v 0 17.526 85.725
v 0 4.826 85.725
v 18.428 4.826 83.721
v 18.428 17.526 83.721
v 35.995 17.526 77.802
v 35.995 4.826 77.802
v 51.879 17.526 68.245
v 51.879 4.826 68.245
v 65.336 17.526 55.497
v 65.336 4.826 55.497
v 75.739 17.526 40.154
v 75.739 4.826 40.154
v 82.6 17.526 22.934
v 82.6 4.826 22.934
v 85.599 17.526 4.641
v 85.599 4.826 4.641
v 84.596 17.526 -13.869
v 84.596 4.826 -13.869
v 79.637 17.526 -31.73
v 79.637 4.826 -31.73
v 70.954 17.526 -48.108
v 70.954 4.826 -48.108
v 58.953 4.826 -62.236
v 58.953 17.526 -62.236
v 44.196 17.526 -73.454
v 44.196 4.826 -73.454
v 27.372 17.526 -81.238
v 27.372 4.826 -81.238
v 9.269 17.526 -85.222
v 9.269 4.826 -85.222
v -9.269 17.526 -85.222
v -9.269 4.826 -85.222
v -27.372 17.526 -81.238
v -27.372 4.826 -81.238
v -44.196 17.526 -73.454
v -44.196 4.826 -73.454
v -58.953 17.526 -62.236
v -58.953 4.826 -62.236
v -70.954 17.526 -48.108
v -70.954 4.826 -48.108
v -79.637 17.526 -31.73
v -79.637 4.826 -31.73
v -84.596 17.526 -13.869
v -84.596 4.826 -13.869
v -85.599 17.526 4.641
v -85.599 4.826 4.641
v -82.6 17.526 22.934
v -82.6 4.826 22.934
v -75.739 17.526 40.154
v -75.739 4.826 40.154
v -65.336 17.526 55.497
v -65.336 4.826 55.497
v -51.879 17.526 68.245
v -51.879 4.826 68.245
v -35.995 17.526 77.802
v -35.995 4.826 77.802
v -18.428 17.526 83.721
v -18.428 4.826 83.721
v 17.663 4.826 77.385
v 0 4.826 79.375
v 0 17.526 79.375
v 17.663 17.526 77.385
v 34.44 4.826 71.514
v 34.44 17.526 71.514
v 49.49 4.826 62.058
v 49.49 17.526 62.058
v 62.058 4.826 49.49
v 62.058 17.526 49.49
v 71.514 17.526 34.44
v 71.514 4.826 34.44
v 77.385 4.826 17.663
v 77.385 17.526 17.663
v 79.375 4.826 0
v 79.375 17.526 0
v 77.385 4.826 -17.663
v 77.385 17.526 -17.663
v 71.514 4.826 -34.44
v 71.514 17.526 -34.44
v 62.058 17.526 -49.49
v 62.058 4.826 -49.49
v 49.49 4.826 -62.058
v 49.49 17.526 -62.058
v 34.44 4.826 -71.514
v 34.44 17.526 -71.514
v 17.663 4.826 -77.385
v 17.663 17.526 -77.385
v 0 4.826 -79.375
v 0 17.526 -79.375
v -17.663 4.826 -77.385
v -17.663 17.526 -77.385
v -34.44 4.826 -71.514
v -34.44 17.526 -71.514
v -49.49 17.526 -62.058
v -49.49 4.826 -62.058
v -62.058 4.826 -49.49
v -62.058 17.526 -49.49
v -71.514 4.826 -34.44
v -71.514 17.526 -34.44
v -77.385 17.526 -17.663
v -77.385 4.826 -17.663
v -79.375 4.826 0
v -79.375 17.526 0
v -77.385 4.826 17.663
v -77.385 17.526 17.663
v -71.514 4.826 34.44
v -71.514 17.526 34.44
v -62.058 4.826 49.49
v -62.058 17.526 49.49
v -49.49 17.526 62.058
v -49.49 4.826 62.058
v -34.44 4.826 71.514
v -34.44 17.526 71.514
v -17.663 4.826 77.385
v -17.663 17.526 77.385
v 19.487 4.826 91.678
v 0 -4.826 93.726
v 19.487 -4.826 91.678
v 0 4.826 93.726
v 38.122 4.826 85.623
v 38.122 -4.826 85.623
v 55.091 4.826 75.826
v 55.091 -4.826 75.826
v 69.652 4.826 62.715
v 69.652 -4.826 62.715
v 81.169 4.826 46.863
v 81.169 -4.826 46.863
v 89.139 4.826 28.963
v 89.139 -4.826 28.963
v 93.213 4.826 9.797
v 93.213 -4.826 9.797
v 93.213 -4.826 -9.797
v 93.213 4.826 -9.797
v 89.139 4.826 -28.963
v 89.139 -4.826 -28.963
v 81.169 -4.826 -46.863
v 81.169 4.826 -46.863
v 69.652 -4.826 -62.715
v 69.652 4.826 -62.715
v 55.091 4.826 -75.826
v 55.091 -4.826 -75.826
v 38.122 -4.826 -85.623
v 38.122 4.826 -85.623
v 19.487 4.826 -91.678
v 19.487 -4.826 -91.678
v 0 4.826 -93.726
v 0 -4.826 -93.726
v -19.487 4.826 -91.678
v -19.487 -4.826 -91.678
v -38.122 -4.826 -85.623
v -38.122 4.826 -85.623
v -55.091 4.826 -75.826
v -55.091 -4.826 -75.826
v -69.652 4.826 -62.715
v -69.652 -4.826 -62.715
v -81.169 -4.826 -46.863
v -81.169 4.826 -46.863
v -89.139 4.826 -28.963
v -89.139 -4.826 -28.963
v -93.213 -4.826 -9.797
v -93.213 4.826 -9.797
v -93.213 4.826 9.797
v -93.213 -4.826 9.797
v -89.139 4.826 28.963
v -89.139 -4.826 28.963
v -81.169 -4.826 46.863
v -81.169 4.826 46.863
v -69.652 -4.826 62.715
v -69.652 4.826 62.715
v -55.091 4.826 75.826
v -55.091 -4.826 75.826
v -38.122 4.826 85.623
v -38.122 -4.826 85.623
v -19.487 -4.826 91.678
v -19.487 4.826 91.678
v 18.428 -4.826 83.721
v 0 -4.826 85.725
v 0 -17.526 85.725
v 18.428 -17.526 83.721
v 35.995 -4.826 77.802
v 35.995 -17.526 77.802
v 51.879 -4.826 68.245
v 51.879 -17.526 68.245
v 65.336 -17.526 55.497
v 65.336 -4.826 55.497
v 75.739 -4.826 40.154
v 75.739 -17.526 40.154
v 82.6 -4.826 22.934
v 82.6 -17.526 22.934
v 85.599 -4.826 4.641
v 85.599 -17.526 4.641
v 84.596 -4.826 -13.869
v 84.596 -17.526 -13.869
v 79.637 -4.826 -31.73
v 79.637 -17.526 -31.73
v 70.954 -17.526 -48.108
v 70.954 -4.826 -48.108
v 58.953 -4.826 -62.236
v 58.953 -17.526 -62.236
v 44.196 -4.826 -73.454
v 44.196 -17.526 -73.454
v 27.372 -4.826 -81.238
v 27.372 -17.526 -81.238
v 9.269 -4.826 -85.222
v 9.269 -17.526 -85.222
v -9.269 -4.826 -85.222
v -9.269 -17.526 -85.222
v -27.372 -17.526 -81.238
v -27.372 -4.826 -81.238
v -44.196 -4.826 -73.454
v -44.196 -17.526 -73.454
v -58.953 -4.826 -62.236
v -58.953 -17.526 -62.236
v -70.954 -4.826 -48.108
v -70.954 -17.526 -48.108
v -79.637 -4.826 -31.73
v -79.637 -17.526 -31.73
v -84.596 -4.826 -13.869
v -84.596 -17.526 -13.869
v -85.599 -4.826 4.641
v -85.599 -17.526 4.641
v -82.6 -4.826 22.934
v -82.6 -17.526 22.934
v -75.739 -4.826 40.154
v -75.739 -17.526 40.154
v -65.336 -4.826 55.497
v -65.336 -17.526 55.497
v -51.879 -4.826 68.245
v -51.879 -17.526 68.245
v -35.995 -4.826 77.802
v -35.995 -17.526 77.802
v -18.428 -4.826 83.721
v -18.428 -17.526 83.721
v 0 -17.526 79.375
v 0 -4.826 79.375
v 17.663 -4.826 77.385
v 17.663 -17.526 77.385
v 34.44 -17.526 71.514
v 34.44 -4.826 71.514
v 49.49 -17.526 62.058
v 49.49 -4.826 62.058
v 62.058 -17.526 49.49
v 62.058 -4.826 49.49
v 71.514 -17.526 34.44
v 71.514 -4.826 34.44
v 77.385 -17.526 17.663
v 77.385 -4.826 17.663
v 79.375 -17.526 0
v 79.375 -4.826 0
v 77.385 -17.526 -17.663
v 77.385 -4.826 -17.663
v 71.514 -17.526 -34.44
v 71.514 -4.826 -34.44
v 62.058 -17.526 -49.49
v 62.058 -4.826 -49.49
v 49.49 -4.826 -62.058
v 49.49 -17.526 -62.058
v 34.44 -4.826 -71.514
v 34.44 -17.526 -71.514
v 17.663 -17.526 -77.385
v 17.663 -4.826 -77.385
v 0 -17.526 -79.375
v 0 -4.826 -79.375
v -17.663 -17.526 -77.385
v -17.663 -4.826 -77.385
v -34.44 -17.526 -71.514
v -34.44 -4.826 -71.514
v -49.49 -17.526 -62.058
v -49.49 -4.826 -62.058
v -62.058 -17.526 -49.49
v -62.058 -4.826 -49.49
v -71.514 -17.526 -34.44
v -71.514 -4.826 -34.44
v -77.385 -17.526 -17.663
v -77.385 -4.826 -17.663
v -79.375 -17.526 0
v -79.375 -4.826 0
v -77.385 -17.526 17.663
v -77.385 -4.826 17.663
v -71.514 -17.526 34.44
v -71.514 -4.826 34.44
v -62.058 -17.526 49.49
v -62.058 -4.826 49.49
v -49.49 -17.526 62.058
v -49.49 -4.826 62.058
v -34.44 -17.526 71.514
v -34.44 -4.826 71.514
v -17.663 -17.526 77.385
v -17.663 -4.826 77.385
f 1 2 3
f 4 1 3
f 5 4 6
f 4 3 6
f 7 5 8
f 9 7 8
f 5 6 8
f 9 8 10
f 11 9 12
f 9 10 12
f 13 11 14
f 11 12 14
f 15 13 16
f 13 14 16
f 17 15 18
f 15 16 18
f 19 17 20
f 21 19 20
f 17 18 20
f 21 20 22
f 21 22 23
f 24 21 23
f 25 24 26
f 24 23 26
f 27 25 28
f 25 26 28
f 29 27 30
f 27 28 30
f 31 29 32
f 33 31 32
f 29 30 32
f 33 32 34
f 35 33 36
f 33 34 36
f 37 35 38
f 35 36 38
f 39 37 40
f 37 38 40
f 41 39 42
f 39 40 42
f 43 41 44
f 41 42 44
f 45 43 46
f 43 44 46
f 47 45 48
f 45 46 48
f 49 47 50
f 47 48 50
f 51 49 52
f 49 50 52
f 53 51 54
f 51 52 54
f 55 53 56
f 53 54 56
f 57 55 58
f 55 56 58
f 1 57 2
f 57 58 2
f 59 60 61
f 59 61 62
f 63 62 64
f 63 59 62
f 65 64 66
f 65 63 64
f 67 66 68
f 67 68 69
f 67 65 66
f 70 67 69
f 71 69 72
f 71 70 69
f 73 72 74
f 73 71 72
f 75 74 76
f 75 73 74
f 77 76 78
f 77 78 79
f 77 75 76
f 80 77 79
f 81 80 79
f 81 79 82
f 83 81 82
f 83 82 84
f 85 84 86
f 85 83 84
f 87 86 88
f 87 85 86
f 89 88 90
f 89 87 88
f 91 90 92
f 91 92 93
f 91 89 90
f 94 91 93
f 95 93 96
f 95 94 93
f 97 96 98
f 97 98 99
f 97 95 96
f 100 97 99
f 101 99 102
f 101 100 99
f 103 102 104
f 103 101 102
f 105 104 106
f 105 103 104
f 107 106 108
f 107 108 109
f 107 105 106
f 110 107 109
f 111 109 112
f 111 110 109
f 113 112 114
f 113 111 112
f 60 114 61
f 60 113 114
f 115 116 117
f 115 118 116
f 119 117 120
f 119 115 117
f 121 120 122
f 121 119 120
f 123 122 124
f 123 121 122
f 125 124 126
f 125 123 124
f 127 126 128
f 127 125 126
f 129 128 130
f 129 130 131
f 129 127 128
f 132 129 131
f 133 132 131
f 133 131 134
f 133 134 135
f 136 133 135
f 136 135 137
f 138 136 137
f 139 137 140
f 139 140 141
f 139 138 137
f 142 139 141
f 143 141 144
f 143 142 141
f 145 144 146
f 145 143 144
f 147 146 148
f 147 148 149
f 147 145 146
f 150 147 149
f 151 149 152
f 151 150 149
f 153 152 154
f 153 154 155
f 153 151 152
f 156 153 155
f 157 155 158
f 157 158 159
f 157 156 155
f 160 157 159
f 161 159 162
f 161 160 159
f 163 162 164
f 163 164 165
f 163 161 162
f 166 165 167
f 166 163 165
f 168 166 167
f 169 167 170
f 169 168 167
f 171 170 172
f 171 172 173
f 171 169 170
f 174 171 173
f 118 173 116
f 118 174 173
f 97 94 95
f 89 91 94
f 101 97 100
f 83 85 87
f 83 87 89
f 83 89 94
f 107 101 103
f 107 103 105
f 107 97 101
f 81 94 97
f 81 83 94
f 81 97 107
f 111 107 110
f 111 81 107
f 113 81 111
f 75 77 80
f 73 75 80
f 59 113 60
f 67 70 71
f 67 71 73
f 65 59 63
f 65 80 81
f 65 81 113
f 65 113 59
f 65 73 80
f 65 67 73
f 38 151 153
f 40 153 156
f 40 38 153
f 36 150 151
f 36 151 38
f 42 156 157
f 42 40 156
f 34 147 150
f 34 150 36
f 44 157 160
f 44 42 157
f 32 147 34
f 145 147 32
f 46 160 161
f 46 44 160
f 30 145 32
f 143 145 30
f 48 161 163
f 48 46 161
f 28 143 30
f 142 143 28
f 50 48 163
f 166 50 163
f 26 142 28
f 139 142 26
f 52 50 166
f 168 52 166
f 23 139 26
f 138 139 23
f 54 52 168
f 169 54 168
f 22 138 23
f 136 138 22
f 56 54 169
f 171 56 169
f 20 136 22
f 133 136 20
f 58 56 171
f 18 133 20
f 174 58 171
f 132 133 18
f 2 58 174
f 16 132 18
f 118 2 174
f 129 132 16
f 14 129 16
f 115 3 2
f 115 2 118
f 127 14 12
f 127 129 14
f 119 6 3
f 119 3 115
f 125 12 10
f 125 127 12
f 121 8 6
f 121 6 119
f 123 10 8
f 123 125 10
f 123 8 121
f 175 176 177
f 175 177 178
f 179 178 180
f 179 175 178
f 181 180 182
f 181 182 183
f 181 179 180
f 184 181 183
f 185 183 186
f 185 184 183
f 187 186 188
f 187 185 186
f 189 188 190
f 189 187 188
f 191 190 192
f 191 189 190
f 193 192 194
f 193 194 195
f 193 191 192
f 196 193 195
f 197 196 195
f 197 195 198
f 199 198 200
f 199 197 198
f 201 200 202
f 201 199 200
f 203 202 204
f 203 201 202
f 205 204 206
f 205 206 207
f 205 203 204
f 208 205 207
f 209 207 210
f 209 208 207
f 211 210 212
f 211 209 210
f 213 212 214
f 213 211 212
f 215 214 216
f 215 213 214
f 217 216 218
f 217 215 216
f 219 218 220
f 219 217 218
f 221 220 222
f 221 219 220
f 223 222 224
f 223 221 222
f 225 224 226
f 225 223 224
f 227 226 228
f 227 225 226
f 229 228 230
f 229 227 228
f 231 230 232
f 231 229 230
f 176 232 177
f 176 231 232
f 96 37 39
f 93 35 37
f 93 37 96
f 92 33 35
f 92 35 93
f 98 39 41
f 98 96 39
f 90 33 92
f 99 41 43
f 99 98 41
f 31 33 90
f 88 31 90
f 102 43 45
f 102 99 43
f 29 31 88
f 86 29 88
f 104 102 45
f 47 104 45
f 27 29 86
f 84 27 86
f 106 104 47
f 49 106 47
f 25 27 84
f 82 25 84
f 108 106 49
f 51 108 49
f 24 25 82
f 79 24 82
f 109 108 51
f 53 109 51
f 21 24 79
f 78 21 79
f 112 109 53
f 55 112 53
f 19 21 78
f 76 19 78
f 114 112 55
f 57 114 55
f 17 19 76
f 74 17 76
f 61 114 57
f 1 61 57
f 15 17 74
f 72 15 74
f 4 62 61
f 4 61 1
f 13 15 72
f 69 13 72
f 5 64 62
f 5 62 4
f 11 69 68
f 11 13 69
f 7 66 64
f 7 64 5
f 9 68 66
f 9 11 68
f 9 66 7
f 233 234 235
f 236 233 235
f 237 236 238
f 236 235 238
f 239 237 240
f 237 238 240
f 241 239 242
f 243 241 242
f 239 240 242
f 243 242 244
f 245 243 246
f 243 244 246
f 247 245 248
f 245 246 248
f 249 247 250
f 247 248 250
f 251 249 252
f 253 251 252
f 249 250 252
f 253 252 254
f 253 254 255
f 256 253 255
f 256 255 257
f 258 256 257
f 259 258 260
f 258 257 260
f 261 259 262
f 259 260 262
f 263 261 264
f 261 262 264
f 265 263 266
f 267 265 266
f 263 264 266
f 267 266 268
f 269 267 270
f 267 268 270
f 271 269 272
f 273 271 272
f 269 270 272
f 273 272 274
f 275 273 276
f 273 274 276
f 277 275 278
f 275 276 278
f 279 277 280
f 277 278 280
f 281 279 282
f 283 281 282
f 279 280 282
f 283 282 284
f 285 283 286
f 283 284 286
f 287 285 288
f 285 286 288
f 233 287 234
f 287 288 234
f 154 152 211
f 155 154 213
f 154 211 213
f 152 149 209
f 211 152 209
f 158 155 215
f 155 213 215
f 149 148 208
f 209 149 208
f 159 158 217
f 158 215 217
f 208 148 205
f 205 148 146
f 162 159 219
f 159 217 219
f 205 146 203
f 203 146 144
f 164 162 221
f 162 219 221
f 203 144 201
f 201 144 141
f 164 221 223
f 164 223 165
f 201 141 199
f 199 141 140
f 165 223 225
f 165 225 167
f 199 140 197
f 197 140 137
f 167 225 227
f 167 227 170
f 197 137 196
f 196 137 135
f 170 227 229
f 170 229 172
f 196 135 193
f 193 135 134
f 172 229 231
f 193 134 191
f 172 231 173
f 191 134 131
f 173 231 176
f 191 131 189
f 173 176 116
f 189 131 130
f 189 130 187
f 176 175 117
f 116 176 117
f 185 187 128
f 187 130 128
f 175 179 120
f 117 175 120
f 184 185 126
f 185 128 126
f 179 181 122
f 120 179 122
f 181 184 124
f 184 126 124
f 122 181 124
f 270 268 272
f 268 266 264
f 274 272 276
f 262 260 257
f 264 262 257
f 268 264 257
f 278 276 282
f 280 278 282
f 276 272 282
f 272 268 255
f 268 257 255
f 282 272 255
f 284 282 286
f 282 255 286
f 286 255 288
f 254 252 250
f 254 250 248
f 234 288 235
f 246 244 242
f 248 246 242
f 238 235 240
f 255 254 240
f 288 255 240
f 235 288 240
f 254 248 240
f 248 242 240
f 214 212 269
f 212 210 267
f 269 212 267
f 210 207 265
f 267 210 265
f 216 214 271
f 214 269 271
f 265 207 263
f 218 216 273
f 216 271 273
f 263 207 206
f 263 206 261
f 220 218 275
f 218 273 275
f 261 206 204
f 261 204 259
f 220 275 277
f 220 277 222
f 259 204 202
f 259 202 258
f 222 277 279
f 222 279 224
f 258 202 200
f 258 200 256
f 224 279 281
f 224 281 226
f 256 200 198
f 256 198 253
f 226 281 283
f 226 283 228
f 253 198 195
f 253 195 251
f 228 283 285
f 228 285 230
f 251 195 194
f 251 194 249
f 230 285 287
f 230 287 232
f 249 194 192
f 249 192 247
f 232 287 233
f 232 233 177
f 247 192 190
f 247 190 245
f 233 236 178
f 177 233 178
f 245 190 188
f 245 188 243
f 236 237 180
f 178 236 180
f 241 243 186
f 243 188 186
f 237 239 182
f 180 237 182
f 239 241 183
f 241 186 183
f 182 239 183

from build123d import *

# Parameters (mm, degrees)
SKETCH1_R           = 93.726
BOSS_EXTRUDE1_DEPTH = 4.826
SKETCH4_R           = 85.725
SKETCH4_R_2         = 79.375
BOSS_EXTRUDE2_DEPTH = 12.7


with BuildPart() as part:
    # Sketch1 → Boss-Extrude1 (new, symmetric)
    with BuildSketch(Plane(origin=(0, 0, 0), x_dir=(1, 0, 0), z_dir=(0, 1, 0))):
        with Locations(Location((0, 0, 0), (0, 0, 270))):
            Circle(SKETCH1_R)
    extrude(amount=BOSS_EXTRUDE1_DEPTH, both=True)

    # Sketch4 → Boss-Extrude2 (add)
    with BuildSketch(Plane(origin=(0, 4.826, 0), x_dir=(1, 0, 0), z_dir=(0, 1, 0))):
        with Locations(Location((0, 0, 0), (0, 0, 270))):
            Circle(SKETCH4_R)
        with Locations(Location((0, 0, 0), (0, 0, 270))):
            Circle(SKETCH4_R_2, mode=Mode.SUBTRACT)
    boss_extrude2 = extrude(amount=BOSS_EXTRUDE2_DEPTH)

    # Mirror2: Boss-Extrude2 across plane
    add(boss_extrude2.mirror(Plane.ZX))


solid = part.part
